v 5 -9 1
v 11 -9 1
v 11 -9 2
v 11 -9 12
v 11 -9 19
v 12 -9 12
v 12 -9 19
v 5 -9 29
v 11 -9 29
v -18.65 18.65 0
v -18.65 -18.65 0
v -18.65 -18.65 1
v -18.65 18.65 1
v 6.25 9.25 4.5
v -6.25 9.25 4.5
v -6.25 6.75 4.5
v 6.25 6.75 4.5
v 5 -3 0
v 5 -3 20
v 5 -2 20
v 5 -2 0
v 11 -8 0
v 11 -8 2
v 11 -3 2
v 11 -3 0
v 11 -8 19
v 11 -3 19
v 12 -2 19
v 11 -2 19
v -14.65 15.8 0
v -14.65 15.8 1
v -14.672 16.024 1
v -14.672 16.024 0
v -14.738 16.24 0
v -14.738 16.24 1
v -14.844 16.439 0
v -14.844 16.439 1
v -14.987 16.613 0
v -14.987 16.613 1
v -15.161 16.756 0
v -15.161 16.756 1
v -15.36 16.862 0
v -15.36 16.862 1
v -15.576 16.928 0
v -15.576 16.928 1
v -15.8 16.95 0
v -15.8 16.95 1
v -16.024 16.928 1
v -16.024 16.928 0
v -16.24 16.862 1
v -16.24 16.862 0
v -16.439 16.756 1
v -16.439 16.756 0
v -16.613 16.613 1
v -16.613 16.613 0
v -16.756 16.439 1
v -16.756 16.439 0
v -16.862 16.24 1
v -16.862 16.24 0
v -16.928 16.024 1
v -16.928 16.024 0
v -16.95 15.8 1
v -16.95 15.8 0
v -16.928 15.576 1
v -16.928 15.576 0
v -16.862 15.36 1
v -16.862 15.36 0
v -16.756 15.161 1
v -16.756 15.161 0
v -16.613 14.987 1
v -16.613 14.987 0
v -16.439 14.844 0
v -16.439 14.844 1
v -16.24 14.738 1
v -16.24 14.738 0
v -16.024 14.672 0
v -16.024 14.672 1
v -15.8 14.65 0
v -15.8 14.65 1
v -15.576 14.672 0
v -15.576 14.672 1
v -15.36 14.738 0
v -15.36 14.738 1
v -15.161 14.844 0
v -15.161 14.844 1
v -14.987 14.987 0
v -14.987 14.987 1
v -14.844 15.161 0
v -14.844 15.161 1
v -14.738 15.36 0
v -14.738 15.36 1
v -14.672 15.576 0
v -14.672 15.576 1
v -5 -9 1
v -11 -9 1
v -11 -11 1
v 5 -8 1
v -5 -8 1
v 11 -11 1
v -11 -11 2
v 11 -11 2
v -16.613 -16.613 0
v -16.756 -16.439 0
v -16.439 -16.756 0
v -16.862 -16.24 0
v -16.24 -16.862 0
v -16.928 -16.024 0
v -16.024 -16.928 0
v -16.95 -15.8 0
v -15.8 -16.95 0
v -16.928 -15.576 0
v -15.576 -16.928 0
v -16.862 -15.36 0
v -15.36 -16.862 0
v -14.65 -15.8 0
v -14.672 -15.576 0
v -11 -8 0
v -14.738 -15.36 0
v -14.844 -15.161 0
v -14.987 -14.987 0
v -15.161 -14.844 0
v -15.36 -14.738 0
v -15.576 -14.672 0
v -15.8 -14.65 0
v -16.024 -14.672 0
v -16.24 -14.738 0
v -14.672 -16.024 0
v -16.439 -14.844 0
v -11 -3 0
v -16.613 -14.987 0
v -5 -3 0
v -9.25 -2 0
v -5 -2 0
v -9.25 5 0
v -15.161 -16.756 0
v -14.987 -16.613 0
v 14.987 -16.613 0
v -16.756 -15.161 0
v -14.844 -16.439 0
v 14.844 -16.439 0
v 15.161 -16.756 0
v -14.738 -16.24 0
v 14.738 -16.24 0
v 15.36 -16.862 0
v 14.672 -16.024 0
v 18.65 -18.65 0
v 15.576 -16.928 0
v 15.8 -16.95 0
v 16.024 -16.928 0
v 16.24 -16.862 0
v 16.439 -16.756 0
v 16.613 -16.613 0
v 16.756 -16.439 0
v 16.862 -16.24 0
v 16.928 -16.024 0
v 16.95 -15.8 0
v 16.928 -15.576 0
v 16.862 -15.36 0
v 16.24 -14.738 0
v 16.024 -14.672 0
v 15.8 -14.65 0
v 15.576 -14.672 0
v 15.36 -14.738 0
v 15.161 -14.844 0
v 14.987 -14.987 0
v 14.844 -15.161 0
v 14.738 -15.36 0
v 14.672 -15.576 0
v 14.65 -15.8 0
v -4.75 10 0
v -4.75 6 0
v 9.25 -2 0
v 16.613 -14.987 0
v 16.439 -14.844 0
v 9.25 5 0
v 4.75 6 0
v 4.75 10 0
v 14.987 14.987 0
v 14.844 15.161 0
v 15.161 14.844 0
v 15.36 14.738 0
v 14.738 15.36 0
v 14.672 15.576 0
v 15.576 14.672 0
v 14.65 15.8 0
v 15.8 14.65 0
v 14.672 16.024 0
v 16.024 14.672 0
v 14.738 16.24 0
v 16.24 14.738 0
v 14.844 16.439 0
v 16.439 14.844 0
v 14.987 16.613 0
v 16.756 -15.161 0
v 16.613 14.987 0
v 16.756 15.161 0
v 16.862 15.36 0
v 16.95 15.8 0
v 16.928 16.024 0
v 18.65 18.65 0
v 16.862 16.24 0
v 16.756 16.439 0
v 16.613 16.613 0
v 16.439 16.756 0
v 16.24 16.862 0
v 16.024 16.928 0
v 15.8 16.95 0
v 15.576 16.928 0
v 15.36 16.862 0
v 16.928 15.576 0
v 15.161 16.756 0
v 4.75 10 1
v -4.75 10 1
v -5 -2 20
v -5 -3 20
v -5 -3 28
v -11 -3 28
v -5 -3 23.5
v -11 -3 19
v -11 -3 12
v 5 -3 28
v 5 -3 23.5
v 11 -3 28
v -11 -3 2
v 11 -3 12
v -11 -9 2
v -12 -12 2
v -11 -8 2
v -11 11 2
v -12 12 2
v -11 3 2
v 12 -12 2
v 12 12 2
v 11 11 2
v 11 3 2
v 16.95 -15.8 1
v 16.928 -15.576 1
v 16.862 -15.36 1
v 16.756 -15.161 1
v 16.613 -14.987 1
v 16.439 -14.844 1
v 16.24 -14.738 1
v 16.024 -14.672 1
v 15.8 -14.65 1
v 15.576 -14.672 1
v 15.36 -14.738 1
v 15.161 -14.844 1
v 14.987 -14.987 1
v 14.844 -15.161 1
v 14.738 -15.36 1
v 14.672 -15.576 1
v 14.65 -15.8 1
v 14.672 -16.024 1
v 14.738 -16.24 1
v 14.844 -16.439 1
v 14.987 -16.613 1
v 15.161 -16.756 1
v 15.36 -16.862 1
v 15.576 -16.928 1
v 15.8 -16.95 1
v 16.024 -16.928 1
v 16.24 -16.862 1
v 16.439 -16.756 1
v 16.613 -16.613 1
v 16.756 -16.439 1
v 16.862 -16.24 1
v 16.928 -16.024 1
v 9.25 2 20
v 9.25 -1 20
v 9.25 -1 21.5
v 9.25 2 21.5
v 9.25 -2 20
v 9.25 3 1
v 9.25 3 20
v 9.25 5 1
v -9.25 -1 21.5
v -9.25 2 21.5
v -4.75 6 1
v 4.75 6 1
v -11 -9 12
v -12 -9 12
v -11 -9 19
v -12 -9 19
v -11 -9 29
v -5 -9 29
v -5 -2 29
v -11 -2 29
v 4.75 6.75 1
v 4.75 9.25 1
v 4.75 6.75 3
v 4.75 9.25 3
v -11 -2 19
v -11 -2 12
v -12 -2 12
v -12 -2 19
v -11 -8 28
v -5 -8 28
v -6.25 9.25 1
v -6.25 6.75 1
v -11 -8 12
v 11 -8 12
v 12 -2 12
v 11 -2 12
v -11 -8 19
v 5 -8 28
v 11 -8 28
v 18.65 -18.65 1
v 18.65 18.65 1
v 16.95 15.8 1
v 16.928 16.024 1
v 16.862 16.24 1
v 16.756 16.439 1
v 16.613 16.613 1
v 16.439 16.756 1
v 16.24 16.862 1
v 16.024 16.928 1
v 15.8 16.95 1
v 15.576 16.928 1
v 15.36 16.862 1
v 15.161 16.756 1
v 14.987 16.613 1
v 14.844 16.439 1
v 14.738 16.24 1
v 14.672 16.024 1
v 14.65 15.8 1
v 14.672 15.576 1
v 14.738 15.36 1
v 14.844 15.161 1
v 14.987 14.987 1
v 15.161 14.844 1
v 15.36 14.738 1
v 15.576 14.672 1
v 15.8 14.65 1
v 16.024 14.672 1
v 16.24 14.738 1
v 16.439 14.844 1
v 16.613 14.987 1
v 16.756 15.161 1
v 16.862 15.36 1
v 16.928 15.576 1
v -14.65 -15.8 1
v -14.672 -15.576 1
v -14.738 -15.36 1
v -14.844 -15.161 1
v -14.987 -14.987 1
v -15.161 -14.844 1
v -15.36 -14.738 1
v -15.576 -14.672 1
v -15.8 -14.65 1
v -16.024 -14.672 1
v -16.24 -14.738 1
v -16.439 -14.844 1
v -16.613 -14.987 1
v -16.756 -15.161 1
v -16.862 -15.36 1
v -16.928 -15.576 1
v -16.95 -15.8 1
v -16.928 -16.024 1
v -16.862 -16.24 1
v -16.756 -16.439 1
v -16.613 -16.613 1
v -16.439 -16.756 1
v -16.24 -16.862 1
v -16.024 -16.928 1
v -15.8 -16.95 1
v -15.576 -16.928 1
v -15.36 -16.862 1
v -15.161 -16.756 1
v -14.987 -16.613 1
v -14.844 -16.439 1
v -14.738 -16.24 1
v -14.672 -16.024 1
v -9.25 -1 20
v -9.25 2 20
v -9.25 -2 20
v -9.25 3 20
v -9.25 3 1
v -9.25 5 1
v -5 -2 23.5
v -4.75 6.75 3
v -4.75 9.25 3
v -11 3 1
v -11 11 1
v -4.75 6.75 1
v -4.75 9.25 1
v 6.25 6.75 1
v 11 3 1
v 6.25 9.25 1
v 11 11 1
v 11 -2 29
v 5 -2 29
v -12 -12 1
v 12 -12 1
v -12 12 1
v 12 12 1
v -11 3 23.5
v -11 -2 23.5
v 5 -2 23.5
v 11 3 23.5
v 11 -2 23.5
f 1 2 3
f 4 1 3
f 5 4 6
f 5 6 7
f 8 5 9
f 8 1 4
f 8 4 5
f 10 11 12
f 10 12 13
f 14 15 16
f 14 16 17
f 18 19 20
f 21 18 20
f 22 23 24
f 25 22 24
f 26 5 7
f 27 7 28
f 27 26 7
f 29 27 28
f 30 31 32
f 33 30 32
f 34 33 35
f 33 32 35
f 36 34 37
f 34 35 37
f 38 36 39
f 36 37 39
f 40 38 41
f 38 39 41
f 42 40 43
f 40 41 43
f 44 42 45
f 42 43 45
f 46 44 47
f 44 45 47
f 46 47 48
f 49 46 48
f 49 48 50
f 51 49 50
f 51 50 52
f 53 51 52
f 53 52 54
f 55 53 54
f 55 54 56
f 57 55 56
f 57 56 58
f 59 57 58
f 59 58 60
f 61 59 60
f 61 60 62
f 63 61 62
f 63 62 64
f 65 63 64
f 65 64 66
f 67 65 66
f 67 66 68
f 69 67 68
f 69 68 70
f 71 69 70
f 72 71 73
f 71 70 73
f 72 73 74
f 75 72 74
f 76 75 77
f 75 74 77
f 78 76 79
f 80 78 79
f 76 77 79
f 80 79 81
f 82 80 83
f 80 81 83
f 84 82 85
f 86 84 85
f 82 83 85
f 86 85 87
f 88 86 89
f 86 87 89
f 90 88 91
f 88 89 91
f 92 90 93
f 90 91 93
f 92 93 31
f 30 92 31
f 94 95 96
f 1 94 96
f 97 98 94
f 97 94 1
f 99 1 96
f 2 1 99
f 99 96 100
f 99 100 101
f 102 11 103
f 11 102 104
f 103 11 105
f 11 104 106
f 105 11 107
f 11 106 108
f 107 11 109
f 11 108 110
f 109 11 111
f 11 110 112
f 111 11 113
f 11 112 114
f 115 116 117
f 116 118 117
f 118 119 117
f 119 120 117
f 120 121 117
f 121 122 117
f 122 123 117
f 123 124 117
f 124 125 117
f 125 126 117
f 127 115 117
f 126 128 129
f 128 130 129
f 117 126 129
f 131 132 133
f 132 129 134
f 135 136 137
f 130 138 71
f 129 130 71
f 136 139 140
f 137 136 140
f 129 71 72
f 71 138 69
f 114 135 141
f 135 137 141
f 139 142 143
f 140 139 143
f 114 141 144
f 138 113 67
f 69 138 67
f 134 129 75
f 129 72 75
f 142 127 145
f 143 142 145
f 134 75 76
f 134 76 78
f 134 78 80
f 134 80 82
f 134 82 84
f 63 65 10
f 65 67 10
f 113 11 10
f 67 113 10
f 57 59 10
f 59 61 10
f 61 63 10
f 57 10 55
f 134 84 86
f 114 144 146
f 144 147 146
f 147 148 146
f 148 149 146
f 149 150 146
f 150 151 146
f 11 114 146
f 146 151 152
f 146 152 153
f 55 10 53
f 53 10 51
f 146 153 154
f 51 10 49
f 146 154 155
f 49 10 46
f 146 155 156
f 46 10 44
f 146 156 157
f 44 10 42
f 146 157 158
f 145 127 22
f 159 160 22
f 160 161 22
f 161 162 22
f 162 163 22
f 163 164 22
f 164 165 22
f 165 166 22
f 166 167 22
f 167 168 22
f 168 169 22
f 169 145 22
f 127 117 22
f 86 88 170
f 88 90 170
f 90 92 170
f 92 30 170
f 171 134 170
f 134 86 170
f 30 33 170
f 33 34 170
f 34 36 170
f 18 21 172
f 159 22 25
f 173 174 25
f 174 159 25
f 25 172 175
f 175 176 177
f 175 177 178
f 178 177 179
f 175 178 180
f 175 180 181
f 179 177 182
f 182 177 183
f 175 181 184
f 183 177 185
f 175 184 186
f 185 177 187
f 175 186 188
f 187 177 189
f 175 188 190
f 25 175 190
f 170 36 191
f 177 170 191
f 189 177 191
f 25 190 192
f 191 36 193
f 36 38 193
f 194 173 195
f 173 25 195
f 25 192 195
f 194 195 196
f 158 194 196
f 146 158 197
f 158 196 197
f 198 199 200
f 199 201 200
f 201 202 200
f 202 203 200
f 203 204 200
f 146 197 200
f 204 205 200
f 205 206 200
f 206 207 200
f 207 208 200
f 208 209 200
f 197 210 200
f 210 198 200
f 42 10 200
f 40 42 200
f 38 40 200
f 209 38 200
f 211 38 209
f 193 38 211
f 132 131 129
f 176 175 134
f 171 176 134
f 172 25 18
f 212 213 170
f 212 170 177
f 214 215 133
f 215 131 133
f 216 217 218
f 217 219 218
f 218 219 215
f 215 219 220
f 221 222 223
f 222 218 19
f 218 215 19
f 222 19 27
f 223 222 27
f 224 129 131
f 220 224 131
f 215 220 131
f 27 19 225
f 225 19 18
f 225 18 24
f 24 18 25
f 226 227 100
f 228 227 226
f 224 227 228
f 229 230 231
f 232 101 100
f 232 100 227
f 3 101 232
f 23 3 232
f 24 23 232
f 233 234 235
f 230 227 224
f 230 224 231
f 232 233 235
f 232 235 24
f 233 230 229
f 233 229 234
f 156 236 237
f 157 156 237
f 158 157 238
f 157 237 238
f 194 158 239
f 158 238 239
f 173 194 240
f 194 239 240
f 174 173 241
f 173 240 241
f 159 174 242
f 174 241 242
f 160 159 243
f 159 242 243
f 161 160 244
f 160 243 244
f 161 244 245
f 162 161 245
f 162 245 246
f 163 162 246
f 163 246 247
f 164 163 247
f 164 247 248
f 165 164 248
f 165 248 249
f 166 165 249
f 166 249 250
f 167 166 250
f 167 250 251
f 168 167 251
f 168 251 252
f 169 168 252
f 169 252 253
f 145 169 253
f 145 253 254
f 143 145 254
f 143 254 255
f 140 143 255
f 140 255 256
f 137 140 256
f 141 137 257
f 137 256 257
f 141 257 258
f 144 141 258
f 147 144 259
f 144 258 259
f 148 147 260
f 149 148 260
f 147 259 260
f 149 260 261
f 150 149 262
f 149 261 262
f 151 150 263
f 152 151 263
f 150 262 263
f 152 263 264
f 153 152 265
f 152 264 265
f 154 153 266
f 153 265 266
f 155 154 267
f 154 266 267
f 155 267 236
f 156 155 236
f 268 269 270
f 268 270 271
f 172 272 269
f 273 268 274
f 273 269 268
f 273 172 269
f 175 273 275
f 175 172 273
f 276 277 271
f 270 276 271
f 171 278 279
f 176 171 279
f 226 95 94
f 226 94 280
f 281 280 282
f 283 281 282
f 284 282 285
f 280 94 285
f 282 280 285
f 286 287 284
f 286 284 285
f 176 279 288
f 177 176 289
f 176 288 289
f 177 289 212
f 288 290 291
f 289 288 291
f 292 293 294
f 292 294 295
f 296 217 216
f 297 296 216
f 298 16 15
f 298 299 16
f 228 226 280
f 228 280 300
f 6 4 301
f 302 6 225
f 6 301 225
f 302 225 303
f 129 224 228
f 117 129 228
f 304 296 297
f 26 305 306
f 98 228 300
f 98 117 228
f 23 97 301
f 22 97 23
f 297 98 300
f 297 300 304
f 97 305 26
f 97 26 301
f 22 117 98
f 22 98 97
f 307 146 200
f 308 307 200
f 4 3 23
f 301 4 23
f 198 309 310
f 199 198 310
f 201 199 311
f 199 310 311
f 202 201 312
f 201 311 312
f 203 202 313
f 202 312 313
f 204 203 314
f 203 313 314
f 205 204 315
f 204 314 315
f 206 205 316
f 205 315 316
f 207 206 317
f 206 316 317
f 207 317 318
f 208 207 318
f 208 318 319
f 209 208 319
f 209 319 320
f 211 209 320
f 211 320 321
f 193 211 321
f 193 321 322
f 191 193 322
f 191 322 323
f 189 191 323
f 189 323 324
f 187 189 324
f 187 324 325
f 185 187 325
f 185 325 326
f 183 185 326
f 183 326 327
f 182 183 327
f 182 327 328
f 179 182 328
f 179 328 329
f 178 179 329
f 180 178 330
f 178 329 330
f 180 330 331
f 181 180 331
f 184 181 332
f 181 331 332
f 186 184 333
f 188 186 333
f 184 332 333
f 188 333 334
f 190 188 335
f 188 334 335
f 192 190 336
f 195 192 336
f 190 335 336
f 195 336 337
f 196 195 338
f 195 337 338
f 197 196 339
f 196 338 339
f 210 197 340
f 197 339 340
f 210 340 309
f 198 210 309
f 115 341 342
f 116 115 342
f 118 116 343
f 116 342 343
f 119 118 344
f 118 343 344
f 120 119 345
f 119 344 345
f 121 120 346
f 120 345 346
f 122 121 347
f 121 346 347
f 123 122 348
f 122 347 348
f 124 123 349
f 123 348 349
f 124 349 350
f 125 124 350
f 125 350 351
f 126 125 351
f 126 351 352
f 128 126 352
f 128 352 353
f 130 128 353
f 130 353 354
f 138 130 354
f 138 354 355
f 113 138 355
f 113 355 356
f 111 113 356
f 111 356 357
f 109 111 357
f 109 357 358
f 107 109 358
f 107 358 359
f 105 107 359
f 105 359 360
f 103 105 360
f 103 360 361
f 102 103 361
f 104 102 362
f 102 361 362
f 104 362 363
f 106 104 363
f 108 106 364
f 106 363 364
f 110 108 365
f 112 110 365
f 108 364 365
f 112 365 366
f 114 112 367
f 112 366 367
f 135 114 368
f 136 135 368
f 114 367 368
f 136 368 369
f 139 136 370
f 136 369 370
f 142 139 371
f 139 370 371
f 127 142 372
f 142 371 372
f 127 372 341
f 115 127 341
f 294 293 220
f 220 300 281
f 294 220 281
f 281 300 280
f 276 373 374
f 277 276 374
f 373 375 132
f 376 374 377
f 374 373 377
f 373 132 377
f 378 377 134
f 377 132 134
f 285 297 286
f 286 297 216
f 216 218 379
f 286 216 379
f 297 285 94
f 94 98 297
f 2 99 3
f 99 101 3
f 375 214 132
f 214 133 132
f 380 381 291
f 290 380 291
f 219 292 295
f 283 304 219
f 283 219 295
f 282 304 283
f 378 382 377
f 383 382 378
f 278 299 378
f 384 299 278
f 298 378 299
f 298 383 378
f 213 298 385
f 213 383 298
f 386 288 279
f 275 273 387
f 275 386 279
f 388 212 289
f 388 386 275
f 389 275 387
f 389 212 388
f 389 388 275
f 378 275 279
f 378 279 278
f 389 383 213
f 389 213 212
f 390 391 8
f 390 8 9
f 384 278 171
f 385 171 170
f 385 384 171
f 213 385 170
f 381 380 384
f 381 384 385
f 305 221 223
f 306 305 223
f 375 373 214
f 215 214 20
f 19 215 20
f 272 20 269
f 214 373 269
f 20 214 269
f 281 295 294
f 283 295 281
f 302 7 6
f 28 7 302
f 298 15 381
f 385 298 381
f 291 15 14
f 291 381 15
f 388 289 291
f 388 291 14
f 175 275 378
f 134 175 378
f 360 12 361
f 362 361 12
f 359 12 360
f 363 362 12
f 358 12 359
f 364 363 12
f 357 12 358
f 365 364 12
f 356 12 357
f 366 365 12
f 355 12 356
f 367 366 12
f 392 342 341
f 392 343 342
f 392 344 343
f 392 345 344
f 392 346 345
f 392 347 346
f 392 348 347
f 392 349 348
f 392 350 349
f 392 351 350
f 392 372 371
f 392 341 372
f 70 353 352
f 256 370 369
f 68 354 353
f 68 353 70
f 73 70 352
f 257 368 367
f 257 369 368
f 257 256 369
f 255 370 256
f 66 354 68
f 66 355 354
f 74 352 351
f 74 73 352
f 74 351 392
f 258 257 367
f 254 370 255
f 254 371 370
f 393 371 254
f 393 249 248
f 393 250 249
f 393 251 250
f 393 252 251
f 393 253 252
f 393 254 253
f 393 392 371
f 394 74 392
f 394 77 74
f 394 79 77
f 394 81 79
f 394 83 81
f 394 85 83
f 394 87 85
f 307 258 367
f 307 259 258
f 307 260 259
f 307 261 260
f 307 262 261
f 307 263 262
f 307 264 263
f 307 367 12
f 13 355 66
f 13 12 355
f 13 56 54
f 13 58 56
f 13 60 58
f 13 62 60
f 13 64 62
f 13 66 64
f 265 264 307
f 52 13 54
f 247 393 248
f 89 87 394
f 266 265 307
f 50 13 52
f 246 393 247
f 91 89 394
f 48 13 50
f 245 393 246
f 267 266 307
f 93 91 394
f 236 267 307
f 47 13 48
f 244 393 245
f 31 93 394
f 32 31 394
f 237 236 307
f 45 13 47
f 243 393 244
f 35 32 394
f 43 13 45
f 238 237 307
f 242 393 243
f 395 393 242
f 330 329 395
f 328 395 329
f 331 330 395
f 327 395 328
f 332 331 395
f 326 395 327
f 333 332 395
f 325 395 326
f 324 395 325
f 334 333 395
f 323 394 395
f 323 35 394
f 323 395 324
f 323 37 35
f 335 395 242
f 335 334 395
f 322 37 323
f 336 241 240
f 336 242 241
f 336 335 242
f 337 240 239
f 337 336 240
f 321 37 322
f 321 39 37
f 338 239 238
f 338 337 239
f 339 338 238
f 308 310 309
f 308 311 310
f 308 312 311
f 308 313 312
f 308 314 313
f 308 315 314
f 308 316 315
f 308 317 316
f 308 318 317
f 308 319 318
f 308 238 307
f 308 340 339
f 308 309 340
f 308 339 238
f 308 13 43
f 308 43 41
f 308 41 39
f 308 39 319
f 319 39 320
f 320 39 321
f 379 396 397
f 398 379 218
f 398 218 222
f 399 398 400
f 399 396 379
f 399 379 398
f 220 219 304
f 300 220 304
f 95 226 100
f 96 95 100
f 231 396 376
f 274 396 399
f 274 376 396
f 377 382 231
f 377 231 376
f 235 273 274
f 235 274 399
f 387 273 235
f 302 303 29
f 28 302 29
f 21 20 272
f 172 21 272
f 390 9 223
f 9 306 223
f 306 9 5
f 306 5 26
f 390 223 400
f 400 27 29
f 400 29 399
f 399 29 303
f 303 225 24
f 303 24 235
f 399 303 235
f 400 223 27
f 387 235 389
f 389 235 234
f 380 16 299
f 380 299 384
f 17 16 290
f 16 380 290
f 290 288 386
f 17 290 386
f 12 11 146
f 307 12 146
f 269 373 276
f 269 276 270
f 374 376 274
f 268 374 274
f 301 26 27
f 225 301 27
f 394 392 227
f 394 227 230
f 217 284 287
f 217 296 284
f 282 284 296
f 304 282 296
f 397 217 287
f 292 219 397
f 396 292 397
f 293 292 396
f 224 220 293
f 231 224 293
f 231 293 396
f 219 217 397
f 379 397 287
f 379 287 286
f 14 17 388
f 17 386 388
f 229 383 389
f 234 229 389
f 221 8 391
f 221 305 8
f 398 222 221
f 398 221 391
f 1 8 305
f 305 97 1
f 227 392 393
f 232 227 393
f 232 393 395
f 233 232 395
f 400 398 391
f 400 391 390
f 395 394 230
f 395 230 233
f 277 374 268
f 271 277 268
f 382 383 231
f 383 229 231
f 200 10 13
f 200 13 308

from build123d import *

# Parameters (mm, degrees)
SKETCH_W        = 37.3
SKETCH_H        = 37.3
PAD_DEPTH       = 1
SKETCH001_R     = 1.15
POCKET_DEPTH    = 1.001
SKETCH002_W     = 24
SKETCH002_H     = 24
SKETCH002_W_2   = 22
SKETCH002_H_2   = 22
PAD001_DEPTH    = 1
POCKET001_DEPTH = 5
SKETCH004_W     = 9.5
SKETCH004_H     = 4
POCKET002_DEPTH = 5
SKETCH005_W     = 1.5
SKETCH005_H     = 2.5
PAD002_DEPTH    = 2
SKETCH006_W     = 12.5
SKETCH006_H     = 2.5
PAD003_DEPTH    = 1.5
PAD004_DEPTH    = 19
SKETCH008_W     = 18.5
SKETCH008_H     = 3
PAD006_DEPTH    = 1.5
SKETCH009_W     = 22
SKETCH009_H     = 6
PAD007_DEPTH    = 2
SKETCH010_W     = 6
SKETCH010_H     = 1
PAD008_DEPTH    = 27
SKETCH011_W     = 6
SKETCH011_H     = 1
PAD009_DEPTH    = 4.5
SKETCH012_W     = 6
SKETCH012_H     = 7
PAD010_DEPTH    = 1
SKETCH013_W     = 7
SKETCH013_H     = 7
PAD011_DEPTH    = 1
SKETCH014_W     = 7
SKETCH014_H     = 7
PAD012_DEPTH    = 1


with BuildPart() as part:
    # Sketch → Pad (new body)
    with BuildSketch(Plane.XY):
        Rectangle(SKETCH_W, SKETCH_H)
    extrude(amount=PAD_DEPTH)

    # Sketch001 (on Face6 of Pad) → Pocket (cut, through all)
    with BuildSketch(Plane.XY.offset(1)):
        with Locations((15.8, 15.8)):
            Circle(SKETCH001_R)
        with Locations((-15.8, -15.8)):
            Circle(SKETCH001_R)
        with Locations((15.8, -15.8)):
            Circle(SKETCH001_R)
        with Locations((-15.8, 15.8)):
            Circle(SKETCH001_R)
    extrude(amount=-POCKET_DEPTH, mode=Mode.SUBTRACT)

    # Sketch002 (on Face5 of Pocket) → Pad001 (join)
    with BuildSketch(Plane.XY.offset(1)):
        Rectangle(SKETCH002_W, SKETCH002_H)
        Rectangle(SKETCH002_W_2, SKETCH002_H_2, mode=Mode.SUBTRACT)
    extrude(amount=PAD001_DEPTH)

    # Sketch003 (on Face20 of Pad001) → Pocket001 (cut)
    with BuildSketch(Plane.XY.offset(1)):
        Polygon((-11, -3), (-11, -8), (11, -8), (11, -3), (5, -3), (5, -2), (9.25, -2), (9.25, 5), (-9.25, 5), (-9.25, -2), (-5, -2), (-5, -3), align=None)
    extrude(amount=-POCKET001_DEPTH, mode=Mode.SUBTRACT)

    # Sketch004 (on Face25 of Pocket001) → Pocket002 (cut)
    with BuildSketch(Plane.XY.offset(1)):
        with Locations((0, 8)):
            Rectangle(SKETCH004_W, SKETCH004_H)
    extrude(amount=-POCKET002_DEPTH, mode=Mode.SUBTRACT)

    # Sketch005 (on Face31 of Pocket002) → Pad002 (join)
    with BuildSketch(Plane.XY.offset(1)):
        with Locations((-5.5, 8)):
            Rectangle(SKETCH005_W, SKETCH005_H)
        with Locations((5.5, 8)):
            Rectangle(SKETCH005_W, SKETCH005_H)
    extrude(amount=PAD002_DEPTH)

    # Sketch006 (on Face40 of Pad002) → Pad003 (join)
    with BuildSketch(Plane.XY.offset(3)):
        with Locations((0, 8)):
            Rectangle(SKETCH006_W, SKETCH006_H)
    extrude(amount=PAD003_DEPTH)

    # Sketch007 (on Face31 of Pad003) → Pad004 (join)
    with BuildSketch(Plane.XY.offset(1)):
        Polygon((-11, 3), (-11, -3), (-5, -3), (-5, -2), (-9.25, -2), (-9.25, 3), align=None)
        Polygon((9.25, 3), (9.25, -2), (5, -2), (5, -3), (11, -3), (11, 3), align=None)
    extrude(amount=PAD004_DEPTH)

    # Sketch008 (on Face31 of Pad004) → Pad006 (join)
    with BuildSketch(Plane.XY.offset(20)):
        Polygon((-11, 3), (-11, 2), (-11, -1), (-11, -3), (11, -3), (11, 3), align=None)
        with Locations((0, 0.5)):
            Rectangle(SKETCH008_W, SKETCH008_H, mode=Mode.SUBTRACT)
    extrude(amount=PAD006_DEPTH)

    # Sketch009 → Pad007 (join)
    with BuildSketch(Plane.XY.offset(21.5)):
        Rectangle(SKETCH009_W, SKETCH009_H)
    extrude(amount=PAD007_DEPTH)

    # Sketch010 (on Face42 of Pad007) → Pad008 (join)
    with BuildSketch(Plane.XY.offset(1)):
        with Locations((-8, -8.5)):
            Rectangle(SKETCH010_W, SKETCH010_H)
        with Locations((8, -8.5)):
            Rectangle(SKETCH010_W, SKETCH010_H)
    extrude(amount=PAD008_DEPTH)

    # Sketch011 (on Face19 of Pad008) → Pad009 (join)
    with BuildSketch(Plane.XY.offset(23.5)):
        with Locations((-8, -2.5)):
            Rectangle(SKETCH011_W, SKETCH011_H)
        with Locations((8, -2.5)):
            Rectangle(SKETCH011_W, SKETCH011_H)
    extrude(amount=PAD009_DEPTH)

    # Sketch012 (on Face62 of Pad009) → Pad010 (join)
    with BuildSketch(Plane.XY.offset(28)):
        with Locations((-8, -5.5)):
            Rectangle(SKETCH012_W, SKETCH012_H)
        with Locations((8, -5.5)):
            Rectangle(SKETCH012_W, SKETCH012_H)
    extrude(amount=PAD010_DEPTH)

    # Sketch013 (on Face54 of Pad010) → Pad011 (join)
    with BuildSketch(Plane(origin=(-11, 0, 0), x_dir=(0, -1, 0), z_dir=(-1, 0, 0))):
        with Locations((5.5, 15.5)):
            Rectangle(SKETCH013_W, SKETCH013_H)
    extrude(amount=PAD011_DEPTH)

    # Sketch014 (on Face18 of Pad011) → Pad012 (join)
    with BuildSketch(Plane.YZ.offset(11)):
        with Locations((-5.5, 15.5)):
            Rectangle(SKETCH014_W, SKETCH014_H)
    extrude(amount=PAD012_DEPTH)


solid = part.part
